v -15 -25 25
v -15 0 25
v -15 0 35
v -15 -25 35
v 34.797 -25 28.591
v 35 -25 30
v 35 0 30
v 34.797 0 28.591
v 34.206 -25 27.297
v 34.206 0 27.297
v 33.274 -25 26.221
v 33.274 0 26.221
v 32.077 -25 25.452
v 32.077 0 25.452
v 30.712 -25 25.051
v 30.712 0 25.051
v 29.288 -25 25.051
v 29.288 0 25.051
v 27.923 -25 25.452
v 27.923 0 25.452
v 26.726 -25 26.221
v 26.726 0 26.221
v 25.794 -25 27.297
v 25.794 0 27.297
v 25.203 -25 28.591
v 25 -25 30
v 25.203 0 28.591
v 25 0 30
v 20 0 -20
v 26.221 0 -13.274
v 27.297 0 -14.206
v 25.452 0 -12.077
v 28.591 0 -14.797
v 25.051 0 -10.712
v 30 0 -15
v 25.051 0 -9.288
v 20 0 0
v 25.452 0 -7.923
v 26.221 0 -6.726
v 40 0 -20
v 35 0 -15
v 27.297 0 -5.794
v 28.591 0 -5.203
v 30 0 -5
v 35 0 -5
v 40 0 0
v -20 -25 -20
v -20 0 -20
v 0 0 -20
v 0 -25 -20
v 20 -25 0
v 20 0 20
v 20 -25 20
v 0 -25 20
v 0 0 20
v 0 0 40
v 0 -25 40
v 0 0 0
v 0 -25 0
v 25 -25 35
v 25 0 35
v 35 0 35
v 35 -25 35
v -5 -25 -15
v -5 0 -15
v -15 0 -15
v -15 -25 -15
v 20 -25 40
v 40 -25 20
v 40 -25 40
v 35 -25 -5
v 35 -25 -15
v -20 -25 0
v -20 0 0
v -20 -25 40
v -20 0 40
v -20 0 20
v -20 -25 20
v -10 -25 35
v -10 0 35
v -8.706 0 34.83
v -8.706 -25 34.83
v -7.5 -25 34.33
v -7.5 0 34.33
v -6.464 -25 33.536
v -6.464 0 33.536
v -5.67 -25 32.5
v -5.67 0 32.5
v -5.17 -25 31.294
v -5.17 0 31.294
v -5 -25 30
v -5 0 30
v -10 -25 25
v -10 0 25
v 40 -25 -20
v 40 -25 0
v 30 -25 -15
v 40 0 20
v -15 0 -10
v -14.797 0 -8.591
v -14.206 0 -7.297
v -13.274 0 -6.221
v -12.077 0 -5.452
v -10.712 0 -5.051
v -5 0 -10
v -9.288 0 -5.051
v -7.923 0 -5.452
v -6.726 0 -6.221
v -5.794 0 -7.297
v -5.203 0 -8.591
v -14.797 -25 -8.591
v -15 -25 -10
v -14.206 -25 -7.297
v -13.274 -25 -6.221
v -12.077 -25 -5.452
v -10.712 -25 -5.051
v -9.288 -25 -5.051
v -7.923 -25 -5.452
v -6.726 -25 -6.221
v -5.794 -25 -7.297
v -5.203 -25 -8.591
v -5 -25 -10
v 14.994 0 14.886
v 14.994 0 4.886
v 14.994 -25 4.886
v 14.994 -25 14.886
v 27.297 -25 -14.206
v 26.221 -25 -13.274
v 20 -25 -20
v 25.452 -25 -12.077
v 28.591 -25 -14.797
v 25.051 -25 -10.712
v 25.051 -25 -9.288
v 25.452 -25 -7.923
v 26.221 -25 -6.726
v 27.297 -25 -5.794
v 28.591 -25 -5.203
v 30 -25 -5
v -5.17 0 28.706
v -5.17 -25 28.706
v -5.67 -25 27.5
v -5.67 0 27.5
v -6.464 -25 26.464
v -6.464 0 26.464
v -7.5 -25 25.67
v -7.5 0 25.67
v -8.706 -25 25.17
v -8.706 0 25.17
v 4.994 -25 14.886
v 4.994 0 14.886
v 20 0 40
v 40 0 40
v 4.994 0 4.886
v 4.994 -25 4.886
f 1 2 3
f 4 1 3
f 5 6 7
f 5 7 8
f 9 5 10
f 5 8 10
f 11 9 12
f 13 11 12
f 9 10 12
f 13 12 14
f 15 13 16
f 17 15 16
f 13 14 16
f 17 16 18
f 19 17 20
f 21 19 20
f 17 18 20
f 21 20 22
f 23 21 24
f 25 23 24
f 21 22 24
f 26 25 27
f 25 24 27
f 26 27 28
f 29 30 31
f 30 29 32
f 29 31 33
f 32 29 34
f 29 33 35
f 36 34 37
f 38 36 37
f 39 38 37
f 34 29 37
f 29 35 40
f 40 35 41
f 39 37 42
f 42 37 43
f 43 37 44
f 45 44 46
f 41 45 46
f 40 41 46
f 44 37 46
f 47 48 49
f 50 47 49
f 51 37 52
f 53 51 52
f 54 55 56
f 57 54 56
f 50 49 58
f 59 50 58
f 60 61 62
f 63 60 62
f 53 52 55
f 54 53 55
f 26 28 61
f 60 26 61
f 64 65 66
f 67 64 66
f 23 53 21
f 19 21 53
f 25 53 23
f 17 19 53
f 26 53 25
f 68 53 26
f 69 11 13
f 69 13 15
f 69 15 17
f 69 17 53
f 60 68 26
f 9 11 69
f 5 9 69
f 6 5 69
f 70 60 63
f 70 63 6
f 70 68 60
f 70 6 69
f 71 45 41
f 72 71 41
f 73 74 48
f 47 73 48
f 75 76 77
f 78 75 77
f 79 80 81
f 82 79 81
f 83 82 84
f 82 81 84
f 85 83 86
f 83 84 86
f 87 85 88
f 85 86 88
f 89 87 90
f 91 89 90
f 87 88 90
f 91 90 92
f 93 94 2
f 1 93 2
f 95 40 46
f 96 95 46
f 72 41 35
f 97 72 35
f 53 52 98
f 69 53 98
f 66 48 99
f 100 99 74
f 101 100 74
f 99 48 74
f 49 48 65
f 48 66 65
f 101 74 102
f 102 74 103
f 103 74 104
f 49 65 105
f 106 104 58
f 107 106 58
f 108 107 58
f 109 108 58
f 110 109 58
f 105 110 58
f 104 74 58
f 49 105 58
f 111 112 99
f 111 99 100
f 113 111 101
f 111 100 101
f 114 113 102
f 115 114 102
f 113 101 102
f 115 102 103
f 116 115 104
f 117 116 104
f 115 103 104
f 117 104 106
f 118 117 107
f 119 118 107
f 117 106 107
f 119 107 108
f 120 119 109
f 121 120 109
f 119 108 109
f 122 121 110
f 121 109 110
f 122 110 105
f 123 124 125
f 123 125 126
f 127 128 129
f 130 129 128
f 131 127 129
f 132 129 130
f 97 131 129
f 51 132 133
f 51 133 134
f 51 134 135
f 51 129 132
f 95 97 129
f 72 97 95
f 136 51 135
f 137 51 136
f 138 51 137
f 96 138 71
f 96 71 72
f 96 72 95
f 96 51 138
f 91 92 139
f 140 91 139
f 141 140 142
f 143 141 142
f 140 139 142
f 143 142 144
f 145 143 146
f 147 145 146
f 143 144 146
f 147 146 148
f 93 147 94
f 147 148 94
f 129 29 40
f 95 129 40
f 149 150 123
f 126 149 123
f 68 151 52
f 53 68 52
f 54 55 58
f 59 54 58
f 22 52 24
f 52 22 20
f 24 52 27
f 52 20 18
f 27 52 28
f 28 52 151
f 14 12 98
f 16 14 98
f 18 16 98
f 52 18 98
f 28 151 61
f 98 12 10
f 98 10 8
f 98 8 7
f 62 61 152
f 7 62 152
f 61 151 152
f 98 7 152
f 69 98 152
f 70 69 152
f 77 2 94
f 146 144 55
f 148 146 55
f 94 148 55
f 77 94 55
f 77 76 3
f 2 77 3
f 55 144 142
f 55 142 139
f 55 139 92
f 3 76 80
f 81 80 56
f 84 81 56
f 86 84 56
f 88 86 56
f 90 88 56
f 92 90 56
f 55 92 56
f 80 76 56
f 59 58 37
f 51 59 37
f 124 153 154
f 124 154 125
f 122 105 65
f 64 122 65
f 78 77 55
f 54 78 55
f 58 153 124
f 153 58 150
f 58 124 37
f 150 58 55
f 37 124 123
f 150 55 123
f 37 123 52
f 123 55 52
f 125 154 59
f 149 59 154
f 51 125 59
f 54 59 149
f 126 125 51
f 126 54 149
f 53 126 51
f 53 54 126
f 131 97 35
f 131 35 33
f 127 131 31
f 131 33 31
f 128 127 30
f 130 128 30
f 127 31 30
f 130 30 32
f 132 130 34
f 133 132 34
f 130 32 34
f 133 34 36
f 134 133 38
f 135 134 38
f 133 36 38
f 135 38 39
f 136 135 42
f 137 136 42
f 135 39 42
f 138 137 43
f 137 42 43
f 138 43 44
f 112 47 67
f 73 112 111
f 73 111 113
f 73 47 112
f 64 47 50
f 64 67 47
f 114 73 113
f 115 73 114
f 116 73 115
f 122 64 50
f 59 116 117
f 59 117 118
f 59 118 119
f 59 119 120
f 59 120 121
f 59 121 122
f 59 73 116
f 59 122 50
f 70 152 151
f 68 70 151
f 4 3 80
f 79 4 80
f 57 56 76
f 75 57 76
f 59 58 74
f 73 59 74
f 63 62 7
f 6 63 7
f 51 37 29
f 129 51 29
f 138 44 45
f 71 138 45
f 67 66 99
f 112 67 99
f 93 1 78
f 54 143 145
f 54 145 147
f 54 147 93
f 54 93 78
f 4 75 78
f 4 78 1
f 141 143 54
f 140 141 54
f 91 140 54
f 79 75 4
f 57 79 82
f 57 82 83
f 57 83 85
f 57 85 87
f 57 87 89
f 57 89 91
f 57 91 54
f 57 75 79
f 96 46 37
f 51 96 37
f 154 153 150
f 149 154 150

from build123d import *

# Parameters (mm, degrees)
F0_W     = 10
F0_H     = 10
F1_DEPTH = 25


with BuildPart() as f1:
    # F0 (on Front) → F1 (new body)
    with BuildSketch(Plane.XZ):
        Polygon((0, 10), (0, 0), (20, 0), (20, 10), (20, 20), (0, 20), align=None)
        with Locations((9.993712, 9.886267)):
            Rectangle(F0_W, F0_H, mode=Mode.SUBTRACT)
        Polygon((-20, 20), (0, 20), (0, 30), (0, 40), (-20, 40), align=None)
        with BuildLine():
            Line((-15, 30), (-15, 35))
            Line((-15, 35), (-10, 35))
            ThreePointArc((-10, 35), (-6.464466, 33.535534), (-5, 30))
            ThreePointArc((-5, 30), (-6.464466, 26.464466), (-10, 25))
            Line((-10, 25), (-15, 25))
            Line((-15, 25), (-15, 30))
        make_face(mode=Mode.SUBTRACT)
        Polygon((20, 30), (20, 20), (40, 20), (40, 40), (20, 40), align=None)
        with BuildLine():
            Line((30, 35), (35, 35))
            Line((35, 35), (35, 30))
            ThreePointArc((35, 30), (30, 25), (25, 30))
            Line((25, 30), (25, 35))
            Line((25, 35), (30, 35))
        make_face(mode=Mode.SUBTRACT)
        Polygon((40, 0), (20, 0), (20, -10), (20, -20), (40, -20), align=None)
        with BuildLine():
            ThreePointArc((30, -15), (25, -10), (30, -5))
            Line((30, -5), (35, -5))
            Line((35, -5), (35, -10))
            Line((35, -10), (35, -15))
            Line((35, -15), (30, -15))
        make_face(mode=Mode.SUBTRACT)
        Polygon((0, -10), (0, 0), (-20, 0), (-20, -20), (0, -20), align=None)
        with BuildLine():
            Line((-10, -15), (-15, -15))
            Line((-15, -15), (-15, -10))
            ThreePointArc((-15, -10), (-10, -5), (-5, -10))
            Line((-5, -10), (-5, -15))
            Line((-5, -15), (-10, -15))
        make_face(mode=Mode.SUBTRACT)
    extrude(amount=F1_DEPTH)


solid = f1.part
